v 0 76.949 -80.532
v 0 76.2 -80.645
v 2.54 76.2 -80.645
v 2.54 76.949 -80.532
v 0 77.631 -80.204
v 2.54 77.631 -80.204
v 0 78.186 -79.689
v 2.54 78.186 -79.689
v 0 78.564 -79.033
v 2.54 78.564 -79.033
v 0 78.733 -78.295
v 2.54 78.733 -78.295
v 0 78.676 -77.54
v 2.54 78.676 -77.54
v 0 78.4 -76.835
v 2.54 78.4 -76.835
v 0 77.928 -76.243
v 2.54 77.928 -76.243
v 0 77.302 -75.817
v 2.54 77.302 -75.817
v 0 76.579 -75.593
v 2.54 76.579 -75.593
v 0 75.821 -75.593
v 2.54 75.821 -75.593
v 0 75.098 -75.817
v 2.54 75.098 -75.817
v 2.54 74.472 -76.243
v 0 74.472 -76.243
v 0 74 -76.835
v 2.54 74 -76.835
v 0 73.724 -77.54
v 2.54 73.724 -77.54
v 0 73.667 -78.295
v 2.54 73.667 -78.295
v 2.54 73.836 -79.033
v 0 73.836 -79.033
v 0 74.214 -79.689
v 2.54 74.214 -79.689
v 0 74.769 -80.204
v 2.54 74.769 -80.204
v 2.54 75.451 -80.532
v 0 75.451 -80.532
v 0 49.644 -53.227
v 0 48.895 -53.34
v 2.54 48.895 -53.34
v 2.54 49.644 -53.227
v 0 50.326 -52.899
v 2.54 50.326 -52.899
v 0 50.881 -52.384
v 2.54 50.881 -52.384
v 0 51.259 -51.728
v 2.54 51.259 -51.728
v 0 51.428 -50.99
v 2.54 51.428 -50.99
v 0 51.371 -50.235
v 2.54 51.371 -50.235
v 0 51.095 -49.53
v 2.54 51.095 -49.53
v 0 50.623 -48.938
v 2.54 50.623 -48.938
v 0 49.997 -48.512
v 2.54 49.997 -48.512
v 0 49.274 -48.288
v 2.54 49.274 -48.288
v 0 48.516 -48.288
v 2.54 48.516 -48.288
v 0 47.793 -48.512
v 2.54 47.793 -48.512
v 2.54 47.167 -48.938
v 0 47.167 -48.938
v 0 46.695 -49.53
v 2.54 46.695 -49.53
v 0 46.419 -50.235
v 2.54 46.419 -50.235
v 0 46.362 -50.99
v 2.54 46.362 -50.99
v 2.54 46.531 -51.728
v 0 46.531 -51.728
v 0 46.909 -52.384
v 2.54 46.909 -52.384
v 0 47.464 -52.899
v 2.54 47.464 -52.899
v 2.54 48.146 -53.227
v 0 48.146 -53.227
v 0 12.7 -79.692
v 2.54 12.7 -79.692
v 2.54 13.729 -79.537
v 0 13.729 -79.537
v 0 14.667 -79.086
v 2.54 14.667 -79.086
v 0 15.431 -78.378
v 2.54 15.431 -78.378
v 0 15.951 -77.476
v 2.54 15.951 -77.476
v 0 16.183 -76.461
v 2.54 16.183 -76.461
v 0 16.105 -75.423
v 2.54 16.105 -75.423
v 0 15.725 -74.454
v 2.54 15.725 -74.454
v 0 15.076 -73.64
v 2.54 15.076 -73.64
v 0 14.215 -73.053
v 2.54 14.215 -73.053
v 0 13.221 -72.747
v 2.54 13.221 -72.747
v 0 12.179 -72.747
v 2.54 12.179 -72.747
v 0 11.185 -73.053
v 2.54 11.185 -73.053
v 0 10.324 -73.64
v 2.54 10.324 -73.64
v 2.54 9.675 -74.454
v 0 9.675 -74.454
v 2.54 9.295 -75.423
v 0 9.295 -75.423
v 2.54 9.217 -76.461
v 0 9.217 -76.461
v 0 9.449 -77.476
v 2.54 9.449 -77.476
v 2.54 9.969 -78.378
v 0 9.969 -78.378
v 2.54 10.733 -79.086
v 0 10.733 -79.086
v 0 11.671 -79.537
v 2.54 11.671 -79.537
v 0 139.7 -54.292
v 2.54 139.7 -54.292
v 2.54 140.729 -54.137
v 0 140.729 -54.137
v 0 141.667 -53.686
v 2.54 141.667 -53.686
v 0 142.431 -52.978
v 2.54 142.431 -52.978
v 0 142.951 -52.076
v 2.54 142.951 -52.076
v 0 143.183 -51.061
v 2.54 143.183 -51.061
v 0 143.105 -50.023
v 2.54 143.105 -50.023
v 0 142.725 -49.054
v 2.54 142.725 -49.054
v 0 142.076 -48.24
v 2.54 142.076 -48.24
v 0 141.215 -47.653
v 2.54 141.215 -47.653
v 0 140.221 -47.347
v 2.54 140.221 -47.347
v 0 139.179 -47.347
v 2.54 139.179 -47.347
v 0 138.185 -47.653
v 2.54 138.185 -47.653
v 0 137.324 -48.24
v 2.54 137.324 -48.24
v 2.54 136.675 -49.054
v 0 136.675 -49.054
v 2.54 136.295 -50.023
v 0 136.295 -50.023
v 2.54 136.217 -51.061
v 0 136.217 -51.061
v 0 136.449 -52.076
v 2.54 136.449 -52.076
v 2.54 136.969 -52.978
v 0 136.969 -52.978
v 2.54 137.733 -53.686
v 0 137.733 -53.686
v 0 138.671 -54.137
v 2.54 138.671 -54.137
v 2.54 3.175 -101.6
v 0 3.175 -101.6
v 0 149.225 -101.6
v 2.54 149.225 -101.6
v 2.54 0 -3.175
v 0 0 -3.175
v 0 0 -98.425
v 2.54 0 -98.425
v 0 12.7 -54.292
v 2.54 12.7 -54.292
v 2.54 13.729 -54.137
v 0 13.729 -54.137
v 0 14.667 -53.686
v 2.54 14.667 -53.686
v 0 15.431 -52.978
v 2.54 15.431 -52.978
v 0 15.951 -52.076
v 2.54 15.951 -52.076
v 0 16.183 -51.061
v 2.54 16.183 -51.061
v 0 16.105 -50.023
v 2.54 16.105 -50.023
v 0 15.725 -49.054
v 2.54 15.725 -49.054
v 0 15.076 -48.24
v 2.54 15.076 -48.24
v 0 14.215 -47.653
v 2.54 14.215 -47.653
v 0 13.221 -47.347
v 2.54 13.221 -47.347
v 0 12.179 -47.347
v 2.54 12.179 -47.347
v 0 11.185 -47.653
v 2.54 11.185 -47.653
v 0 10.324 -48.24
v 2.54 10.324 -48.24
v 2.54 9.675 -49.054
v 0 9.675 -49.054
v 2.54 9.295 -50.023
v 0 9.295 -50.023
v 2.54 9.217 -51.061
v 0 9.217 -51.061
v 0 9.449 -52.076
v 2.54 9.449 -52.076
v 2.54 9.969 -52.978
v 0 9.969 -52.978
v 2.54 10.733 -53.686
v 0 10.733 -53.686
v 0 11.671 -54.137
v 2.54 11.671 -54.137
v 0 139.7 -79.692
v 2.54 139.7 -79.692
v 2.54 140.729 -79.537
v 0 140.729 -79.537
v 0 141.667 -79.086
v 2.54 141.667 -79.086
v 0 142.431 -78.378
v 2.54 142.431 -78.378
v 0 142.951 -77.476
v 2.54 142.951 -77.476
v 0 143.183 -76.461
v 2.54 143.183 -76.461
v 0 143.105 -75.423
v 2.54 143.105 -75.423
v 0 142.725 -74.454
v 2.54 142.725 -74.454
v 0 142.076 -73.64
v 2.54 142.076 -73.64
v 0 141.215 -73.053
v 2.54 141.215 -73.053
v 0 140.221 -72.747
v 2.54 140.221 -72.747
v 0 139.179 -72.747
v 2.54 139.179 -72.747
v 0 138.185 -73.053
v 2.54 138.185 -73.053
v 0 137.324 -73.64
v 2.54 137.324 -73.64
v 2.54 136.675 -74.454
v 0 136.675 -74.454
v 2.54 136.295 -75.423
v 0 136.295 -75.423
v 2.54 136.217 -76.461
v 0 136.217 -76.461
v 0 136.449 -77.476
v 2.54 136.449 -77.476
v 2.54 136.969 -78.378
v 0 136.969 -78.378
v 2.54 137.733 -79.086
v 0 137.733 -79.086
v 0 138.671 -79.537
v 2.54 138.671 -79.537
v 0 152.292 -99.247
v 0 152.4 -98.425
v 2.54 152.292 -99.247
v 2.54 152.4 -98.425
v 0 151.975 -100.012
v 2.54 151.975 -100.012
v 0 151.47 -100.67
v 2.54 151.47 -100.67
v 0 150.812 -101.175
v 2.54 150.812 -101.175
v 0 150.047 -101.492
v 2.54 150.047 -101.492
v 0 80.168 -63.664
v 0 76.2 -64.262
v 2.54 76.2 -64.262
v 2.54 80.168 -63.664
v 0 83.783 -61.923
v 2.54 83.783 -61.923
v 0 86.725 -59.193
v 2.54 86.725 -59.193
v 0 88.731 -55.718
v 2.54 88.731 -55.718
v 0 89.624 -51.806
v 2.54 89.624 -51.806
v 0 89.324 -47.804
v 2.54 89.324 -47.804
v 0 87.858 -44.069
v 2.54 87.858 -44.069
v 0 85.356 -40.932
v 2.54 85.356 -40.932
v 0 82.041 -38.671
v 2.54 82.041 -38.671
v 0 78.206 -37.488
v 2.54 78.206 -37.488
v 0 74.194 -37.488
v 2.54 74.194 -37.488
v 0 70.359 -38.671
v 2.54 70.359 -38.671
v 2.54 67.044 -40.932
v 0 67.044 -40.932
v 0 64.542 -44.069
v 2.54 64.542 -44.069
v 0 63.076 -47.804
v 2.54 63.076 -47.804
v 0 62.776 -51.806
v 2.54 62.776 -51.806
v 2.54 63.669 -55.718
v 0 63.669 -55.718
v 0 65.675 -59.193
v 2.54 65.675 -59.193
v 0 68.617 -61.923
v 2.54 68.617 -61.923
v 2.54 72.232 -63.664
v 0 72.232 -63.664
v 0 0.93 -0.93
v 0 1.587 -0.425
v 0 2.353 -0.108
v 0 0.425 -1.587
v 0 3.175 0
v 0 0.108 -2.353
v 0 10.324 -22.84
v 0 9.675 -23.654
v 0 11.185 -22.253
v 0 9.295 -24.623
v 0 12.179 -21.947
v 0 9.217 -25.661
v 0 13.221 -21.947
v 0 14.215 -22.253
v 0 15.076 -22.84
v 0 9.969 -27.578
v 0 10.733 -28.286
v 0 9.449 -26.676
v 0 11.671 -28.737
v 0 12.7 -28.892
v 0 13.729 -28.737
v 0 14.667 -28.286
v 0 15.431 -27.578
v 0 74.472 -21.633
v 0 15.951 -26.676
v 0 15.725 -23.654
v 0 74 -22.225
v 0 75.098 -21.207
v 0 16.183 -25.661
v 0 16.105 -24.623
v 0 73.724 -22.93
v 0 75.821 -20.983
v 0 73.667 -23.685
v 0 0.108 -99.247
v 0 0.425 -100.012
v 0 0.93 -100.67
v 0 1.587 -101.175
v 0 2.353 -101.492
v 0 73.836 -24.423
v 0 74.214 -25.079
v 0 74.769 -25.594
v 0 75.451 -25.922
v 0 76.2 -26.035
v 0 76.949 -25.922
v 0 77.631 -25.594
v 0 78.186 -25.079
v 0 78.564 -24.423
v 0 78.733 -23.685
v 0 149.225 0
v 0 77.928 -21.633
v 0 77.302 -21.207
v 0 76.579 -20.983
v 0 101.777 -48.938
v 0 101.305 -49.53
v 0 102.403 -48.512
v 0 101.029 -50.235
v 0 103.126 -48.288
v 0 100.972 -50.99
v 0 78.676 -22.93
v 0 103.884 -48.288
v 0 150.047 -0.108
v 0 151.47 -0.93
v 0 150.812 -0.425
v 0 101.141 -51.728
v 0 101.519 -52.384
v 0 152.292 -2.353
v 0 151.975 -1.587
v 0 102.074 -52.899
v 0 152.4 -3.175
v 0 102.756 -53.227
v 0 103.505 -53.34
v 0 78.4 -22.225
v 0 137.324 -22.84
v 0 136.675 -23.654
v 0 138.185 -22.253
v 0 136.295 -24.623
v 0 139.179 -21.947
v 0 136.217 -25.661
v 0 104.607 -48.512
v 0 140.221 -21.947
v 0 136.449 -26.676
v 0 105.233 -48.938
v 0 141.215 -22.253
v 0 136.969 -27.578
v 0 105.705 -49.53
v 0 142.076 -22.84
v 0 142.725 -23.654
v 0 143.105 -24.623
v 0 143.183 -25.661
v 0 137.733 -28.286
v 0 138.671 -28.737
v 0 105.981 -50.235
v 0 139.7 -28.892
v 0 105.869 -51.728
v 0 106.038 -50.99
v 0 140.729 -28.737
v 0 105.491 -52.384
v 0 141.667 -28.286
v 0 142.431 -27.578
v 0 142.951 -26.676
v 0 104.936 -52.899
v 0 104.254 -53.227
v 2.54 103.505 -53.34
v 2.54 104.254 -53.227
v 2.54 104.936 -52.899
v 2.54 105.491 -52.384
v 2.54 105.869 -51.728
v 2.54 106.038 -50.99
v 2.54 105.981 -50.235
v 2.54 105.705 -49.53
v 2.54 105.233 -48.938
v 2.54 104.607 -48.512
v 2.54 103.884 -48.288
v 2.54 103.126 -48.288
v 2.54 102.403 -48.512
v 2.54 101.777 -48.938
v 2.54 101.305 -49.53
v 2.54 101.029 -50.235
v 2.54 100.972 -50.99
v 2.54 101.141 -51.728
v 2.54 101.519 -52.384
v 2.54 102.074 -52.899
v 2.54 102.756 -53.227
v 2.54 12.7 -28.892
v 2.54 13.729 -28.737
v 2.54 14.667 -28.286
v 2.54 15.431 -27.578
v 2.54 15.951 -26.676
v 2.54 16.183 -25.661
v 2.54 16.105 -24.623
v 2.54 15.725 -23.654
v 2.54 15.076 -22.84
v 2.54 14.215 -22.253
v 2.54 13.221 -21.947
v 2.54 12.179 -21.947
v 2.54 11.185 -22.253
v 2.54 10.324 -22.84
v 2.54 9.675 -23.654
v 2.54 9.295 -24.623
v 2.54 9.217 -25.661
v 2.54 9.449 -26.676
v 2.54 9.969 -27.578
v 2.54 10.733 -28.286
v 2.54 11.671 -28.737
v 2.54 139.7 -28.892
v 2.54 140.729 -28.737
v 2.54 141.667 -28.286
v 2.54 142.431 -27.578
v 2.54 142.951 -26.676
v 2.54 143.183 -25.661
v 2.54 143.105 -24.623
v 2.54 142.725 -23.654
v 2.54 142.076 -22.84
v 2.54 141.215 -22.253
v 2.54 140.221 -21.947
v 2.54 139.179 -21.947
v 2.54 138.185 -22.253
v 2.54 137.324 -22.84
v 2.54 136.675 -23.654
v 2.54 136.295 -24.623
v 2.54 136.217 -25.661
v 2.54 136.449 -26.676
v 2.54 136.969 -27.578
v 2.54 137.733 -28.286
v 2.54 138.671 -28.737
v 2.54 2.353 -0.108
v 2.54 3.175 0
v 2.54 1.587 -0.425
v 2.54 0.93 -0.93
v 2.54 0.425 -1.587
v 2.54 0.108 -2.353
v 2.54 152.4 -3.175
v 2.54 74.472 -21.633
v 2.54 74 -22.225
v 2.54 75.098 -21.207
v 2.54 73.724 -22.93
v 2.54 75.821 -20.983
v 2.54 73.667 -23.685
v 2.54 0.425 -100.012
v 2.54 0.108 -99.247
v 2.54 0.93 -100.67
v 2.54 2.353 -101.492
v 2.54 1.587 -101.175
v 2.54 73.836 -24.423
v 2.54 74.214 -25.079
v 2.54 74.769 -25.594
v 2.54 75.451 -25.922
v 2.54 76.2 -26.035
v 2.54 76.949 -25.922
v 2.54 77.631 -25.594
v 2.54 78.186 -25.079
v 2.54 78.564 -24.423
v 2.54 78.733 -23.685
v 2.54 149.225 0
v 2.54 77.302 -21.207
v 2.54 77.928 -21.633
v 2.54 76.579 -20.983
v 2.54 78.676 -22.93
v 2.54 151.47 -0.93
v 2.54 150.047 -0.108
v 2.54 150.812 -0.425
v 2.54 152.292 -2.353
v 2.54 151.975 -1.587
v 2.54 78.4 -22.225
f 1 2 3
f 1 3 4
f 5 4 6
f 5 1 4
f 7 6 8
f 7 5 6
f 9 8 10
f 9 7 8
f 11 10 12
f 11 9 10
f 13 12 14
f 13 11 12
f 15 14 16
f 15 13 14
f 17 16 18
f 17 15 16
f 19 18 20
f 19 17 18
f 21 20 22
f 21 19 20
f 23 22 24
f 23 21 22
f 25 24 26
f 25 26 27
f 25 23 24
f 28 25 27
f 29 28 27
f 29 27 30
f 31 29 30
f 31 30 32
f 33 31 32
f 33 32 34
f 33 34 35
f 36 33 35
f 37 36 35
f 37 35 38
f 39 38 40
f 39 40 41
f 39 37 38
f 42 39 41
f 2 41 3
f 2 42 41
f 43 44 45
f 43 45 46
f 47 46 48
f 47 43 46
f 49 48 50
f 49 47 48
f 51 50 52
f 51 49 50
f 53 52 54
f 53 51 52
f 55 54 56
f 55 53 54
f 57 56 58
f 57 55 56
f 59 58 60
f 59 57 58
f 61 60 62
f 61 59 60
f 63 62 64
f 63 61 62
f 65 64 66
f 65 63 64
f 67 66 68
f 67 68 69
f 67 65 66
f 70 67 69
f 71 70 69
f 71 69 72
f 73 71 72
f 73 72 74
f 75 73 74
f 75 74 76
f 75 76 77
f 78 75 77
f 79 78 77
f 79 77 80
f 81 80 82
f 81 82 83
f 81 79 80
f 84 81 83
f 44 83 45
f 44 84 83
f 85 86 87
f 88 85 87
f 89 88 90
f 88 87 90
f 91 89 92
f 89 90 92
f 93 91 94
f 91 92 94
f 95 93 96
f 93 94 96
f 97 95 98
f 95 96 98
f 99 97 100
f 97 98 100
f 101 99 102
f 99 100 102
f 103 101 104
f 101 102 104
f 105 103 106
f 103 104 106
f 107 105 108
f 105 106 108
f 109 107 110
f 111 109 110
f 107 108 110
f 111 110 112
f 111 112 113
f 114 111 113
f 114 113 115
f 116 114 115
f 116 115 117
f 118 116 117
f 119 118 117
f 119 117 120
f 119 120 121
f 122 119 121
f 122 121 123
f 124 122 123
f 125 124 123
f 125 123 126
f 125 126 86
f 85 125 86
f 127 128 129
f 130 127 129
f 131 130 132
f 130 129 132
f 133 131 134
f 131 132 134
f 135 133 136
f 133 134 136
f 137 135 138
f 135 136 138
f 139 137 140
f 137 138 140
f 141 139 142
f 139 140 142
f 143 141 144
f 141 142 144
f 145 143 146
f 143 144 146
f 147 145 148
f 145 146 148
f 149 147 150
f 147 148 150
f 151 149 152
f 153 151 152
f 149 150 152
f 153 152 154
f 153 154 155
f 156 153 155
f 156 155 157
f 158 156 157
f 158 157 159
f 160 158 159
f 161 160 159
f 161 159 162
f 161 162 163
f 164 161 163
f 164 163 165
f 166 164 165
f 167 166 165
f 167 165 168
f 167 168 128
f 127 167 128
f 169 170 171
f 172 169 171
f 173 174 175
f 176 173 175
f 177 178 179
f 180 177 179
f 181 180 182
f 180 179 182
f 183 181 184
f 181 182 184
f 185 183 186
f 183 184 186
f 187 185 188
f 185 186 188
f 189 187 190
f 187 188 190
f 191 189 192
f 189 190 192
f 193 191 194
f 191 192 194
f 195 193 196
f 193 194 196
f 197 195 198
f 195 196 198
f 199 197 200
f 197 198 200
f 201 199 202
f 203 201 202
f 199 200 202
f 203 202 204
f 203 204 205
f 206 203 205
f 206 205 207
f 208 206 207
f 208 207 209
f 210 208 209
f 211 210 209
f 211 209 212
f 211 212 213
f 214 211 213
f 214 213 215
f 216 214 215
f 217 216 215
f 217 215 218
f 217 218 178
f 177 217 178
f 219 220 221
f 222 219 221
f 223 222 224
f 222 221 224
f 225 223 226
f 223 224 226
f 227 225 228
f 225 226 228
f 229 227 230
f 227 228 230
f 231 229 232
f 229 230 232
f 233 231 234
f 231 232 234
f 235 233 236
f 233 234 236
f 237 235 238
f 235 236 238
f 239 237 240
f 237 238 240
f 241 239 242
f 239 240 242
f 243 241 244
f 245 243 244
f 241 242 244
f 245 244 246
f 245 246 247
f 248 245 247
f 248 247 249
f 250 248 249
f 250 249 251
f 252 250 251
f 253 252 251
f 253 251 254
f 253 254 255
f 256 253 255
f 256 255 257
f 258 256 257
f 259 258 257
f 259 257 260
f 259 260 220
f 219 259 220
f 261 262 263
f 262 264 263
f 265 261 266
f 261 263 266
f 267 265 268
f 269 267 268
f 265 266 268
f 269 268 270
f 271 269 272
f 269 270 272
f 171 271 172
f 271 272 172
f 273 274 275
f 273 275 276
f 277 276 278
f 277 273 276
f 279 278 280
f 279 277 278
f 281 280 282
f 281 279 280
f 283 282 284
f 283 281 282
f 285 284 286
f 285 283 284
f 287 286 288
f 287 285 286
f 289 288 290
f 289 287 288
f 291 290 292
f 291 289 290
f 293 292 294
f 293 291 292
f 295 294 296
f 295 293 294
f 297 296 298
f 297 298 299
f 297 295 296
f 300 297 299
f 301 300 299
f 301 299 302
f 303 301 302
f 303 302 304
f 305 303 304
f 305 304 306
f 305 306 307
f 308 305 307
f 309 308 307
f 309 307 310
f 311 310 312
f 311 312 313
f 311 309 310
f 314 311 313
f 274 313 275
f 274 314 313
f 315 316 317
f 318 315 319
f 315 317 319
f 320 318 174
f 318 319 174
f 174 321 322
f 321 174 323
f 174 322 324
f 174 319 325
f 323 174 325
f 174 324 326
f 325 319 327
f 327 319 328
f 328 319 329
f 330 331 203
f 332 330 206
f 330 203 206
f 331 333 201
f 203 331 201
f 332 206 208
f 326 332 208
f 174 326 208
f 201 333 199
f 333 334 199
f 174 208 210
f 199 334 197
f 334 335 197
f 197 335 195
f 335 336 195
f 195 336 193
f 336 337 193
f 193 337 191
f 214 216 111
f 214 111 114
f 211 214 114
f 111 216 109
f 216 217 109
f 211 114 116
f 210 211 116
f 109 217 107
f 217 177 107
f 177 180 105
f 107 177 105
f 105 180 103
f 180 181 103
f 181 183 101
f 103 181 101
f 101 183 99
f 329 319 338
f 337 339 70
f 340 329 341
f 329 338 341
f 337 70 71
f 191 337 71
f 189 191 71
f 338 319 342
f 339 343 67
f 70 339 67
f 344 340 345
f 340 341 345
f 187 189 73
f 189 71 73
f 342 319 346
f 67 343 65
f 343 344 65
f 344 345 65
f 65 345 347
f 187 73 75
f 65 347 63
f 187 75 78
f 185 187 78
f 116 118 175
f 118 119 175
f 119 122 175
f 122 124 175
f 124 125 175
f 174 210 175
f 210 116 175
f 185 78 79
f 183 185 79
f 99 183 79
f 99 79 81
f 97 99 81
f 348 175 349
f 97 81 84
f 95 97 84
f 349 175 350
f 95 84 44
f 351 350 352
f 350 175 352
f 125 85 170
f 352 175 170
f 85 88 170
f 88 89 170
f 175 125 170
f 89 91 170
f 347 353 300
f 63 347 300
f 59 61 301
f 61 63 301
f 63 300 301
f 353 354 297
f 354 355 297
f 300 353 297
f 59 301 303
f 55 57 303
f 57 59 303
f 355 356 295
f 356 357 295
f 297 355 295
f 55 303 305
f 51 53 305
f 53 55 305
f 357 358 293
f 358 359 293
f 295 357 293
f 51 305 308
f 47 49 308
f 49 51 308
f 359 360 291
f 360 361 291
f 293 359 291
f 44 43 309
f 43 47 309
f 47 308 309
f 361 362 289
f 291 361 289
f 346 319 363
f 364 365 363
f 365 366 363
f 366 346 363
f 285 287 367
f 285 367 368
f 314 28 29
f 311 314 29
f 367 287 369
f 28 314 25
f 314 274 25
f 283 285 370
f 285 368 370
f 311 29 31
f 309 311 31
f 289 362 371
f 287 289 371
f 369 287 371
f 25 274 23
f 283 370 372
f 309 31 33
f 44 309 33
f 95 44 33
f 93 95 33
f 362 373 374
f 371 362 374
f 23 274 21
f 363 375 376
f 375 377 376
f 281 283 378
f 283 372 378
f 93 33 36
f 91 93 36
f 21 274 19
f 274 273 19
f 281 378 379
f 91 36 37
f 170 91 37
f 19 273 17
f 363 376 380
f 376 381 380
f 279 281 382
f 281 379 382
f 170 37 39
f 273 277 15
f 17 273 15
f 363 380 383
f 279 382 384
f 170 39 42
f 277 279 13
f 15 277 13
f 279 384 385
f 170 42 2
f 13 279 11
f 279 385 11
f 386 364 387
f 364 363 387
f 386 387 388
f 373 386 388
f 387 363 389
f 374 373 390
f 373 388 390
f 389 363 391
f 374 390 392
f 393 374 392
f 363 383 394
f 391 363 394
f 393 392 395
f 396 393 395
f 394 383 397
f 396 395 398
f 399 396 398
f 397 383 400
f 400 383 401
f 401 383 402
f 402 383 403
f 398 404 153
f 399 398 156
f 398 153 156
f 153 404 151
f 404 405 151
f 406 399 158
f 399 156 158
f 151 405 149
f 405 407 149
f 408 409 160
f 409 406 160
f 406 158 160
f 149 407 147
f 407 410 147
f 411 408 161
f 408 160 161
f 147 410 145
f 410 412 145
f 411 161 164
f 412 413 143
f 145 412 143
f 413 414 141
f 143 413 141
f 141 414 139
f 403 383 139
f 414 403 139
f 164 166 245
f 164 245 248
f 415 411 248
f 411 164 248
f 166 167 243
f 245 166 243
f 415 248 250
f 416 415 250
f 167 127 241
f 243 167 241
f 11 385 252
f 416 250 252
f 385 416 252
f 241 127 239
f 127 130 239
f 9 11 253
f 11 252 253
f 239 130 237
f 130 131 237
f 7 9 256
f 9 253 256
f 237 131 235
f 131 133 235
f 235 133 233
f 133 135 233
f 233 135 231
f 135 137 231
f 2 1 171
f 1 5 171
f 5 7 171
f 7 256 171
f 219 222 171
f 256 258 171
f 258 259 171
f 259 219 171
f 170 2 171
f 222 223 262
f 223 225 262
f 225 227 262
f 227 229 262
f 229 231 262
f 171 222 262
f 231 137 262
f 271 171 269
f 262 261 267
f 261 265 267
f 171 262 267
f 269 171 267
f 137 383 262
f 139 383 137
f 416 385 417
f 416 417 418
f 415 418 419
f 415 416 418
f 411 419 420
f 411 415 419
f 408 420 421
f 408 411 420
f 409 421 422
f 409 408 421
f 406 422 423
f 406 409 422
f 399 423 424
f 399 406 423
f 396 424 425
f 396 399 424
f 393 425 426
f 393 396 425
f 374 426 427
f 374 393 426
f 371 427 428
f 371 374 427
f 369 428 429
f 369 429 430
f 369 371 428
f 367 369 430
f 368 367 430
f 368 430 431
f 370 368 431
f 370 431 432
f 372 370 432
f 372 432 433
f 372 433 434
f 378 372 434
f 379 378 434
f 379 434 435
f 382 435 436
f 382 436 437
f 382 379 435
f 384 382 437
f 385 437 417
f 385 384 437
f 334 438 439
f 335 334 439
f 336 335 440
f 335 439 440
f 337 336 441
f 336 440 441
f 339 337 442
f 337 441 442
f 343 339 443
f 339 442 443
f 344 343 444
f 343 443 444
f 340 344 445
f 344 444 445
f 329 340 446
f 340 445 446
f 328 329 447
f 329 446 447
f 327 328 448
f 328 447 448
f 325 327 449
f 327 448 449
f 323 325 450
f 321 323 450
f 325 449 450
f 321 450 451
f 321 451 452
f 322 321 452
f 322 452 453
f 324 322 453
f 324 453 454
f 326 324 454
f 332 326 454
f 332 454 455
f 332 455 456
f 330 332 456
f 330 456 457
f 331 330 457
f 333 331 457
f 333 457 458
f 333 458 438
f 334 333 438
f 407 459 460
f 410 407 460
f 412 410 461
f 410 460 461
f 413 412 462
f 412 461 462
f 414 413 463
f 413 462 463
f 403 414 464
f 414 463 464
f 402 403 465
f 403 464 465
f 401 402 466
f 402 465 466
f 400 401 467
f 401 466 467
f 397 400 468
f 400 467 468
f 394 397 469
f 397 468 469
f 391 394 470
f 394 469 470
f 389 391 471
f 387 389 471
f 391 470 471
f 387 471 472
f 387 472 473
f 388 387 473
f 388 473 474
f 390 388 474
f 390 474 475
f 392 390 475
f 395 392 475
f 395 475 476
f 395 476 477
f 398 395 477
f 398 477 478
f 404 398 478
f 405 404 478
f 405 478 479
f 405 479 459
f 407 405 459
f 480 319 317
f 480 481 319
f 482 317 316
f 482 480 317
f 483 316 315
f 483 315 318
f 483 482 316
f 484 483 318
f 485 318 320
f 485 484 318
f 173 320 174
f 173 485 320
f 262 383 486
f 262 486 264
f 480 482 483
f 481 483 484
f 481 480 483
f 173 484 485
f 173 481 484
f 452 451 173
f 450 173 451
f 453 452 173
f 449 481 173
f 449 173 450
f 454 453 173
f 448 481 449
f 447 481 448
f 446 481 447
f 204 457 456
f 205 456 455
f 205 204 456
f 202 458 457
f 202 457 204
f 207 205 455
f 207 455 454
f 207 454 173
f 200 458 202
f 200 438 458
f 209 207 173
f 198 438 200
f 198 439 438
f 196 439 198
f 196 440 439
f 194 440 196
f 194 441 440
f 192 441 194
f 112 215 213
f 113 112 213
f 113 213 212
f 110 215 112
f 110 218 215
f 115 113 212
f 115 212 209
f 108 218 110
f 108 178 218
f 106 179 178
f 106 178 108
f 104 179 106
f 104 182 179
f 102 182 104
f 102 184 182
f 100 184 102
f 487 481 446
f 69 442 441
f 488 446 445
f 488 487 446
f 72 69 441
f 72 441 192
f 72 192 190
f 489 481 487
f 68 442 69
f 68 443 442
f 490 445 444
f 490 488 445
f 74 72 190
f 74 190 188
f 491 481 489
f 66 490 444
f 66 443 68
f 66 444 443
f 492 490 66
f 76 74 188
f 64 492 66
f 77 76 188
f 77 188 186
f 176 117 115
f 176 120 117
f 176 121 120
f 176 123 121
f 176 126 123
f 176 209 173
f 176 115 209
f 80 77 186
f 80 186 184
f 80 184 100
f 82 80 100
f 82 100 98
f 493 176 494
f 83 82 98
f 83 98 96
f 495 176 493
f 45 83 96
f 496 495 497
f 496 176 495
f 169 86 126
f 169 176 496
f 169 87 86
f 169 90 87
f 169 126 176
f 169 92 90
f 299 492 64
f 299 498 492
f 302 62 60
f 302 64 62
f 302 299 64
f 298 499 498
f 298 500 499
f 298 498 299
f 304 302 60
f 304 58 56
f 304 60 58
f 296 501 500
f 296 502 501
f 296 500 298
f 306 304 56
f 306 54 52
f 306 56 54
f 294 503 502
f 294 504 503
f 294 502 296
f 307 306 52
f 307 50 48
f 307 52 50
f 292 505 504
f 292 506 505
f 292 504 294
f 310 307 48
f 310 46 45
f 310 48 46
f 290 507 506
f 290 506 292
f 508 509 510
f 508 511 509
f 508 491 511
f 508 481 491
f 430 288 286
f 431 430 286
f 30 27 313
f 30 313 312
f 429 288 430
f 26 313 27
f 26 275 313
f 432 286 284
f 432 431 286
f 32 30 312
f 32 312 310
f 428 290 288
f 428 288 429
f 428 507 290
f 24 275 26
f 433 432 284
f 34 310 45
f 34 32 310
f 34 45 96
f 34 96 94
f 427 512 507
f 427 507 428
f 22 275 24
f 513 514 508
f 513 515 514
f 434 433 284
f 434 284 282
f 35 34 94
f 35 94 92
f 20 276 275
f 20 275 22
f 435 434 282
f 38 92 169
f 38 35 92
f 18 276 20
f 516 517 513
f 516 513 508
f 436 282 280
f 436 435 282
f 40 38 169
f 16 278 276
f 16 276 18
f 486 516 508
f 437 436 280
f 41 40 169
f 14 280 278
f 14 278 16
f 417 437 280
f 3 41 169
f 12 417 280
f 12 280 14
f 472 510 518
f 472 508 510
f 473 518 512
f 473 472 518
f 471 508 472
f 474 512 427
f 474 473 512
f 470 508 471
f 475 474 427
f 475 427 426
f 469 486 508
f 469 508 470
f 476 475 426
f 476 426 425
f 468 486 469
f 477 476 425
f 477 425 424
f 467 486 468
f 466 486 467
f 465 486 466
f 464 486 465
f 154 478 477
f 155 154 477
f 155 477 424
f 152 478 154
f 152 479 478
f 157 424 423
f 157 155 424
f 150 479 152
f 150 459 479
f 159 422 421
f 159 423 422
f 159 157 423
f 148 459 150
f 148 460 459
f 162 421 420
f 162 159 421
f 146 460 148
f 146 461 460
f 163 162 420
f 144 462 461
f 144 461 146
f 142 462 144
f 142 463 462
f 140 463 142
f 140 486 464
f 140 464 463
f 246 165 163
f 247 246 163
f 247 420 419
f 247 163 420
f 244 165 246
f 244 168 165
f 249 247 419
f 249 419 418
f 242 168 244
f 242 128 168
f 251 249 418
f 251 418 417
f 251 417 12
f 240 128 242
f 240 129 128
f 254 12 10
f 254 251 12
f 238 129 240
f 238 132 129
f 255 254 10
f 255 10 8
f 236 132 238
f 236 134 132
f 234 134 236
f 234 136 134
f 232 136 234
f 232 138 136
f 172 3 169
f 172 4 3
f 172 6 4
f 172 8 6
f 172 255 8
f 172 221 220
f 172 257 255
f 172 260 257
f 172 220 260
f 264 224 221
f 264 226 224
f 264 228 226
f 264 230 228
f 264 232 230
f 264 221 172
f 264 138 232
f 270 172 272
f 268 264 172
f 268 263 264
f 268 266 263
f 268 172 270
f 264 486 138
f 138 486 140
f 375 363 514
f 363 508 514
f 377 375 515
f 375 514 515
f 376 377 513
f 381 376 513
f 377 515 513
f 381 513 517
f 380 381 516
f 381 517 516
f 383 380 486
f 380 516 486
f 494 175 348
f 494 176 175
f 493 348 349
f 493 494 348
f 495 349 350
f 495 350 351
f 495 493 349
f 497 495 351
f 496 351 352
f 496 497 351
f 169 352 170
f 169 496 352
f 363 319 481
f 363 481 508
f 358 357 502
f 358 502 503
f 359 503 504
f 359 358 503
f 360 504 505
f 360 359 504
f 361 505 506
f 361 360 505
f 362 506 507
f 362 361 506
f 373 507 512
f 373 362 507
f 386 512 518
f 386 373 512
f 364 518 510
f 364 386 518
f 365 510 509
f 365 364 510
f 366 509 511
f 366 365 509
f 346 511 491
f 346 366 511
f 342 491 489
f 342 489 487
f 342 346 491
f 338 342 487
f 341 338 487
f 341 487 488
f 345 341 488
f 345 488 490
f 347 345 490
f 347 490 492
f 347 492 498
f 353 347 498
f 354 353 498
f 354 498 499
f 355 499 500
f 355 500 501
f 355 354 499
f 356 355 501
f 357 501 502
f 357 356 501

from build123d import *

# Parameters (mm, degrees)
SKETCH1_W           = 101.6
SKETCH1_H           = 152.4
SKETCH1_R           = 2.54
SKETCH1_R_2         = 13.462
BOSS_EXTRUDE2_DEPTH = 2.54
SKETCH2_R           = 3.4925
CUT_EXTRUDE1_DEPTH  = 184.179615678
LPATTERN2_COUNT     = 2
LPATTERN2_PITCH     = 25.4
LPATTERN3_COUNT     = 2
LPATTERN3_PITCH     = 25.4
FILLET1_R           = 3.175


with BuildPart() as part:
    # Sketch1 → Boss-Extrude2 (new body)
    with BuildSketch(Plane(origin=(0, 0, 0), x_dir=(0, 0, -1), z_dir=(1, 0, 0))):
        with Locations((50.8, 76.2)):
            Rectangle(SKETCH1_W, SKETCH1_H)
        with Locations((78.105, 76.2)):
            Circle(SKETCH1_R, mode=Mode.SUBTRACT)
        with Locations((50.8, 76.2)):
            Circle(SKETCH1_R_2, mode=Mode.SUBTRACT)
        with Locations((50.8, 48.895)):
            Circle(SKETCH1_R, mode=Mode.SUBTRACT)
        with Locations((23.495, 76.2)):
            Circle(SKETCH1_R, mode=Mode.SUBTRACT)
        with Locations((50.8, 103.505)):
            Circle(SKETCH1_R, mode=Mode.SUBTRACT)
    extrude(amount=BOSS_EXTRUDE2_DEPTH)

    # Sketch2 → Cut-Extrude1 (cut, through all)
    with BuildSketch(Plane(origin=(2.54, 0, 0), x_dir=(0, 0, -1), z_dir=(1, 0, 0))):
        with Locations((50.8, 139.7)):
            Circle(SKETCH2_R)
        with Locations((50.8, 12.7)):
            Circle(SKETCH2_R)
    cut_extrude1 = extrude(amount=-CUT_EXTRUDE1_DEPTH, mode=Mode.SUBTRACT)

    # LPattern2: Cut-Extrude1 ×2
    with Locations(*[(0, 0, -i * LPATTERN2_PITCH) for i in range(1, LPATTERN2_COUNT)]):
        add(cut_extrude1, mode=Mode.SUBTRACT)

    # LPattern3: Cut-Extrude1 ×2
    with Locations(*[(0, 0, i * LPATTERN3_PITCH) for i in range(1, LPATTERN3_COUNT)]):
        add(cut_extrude1, mode=Mode.SUBTRACT)

    # Fillet1
    fillet1_edges = [part.edges().sort_by_distance(p)[0] for p in [
        (1.27, 152.4, 0),
        (1.27, 152.4, -101.6),
        (1.27, 0, -101.6),
        (1.27, 0, 0),
    ]]
    fillet(fillet1_edges, radius=FILLET1_R)


solid = part.part
